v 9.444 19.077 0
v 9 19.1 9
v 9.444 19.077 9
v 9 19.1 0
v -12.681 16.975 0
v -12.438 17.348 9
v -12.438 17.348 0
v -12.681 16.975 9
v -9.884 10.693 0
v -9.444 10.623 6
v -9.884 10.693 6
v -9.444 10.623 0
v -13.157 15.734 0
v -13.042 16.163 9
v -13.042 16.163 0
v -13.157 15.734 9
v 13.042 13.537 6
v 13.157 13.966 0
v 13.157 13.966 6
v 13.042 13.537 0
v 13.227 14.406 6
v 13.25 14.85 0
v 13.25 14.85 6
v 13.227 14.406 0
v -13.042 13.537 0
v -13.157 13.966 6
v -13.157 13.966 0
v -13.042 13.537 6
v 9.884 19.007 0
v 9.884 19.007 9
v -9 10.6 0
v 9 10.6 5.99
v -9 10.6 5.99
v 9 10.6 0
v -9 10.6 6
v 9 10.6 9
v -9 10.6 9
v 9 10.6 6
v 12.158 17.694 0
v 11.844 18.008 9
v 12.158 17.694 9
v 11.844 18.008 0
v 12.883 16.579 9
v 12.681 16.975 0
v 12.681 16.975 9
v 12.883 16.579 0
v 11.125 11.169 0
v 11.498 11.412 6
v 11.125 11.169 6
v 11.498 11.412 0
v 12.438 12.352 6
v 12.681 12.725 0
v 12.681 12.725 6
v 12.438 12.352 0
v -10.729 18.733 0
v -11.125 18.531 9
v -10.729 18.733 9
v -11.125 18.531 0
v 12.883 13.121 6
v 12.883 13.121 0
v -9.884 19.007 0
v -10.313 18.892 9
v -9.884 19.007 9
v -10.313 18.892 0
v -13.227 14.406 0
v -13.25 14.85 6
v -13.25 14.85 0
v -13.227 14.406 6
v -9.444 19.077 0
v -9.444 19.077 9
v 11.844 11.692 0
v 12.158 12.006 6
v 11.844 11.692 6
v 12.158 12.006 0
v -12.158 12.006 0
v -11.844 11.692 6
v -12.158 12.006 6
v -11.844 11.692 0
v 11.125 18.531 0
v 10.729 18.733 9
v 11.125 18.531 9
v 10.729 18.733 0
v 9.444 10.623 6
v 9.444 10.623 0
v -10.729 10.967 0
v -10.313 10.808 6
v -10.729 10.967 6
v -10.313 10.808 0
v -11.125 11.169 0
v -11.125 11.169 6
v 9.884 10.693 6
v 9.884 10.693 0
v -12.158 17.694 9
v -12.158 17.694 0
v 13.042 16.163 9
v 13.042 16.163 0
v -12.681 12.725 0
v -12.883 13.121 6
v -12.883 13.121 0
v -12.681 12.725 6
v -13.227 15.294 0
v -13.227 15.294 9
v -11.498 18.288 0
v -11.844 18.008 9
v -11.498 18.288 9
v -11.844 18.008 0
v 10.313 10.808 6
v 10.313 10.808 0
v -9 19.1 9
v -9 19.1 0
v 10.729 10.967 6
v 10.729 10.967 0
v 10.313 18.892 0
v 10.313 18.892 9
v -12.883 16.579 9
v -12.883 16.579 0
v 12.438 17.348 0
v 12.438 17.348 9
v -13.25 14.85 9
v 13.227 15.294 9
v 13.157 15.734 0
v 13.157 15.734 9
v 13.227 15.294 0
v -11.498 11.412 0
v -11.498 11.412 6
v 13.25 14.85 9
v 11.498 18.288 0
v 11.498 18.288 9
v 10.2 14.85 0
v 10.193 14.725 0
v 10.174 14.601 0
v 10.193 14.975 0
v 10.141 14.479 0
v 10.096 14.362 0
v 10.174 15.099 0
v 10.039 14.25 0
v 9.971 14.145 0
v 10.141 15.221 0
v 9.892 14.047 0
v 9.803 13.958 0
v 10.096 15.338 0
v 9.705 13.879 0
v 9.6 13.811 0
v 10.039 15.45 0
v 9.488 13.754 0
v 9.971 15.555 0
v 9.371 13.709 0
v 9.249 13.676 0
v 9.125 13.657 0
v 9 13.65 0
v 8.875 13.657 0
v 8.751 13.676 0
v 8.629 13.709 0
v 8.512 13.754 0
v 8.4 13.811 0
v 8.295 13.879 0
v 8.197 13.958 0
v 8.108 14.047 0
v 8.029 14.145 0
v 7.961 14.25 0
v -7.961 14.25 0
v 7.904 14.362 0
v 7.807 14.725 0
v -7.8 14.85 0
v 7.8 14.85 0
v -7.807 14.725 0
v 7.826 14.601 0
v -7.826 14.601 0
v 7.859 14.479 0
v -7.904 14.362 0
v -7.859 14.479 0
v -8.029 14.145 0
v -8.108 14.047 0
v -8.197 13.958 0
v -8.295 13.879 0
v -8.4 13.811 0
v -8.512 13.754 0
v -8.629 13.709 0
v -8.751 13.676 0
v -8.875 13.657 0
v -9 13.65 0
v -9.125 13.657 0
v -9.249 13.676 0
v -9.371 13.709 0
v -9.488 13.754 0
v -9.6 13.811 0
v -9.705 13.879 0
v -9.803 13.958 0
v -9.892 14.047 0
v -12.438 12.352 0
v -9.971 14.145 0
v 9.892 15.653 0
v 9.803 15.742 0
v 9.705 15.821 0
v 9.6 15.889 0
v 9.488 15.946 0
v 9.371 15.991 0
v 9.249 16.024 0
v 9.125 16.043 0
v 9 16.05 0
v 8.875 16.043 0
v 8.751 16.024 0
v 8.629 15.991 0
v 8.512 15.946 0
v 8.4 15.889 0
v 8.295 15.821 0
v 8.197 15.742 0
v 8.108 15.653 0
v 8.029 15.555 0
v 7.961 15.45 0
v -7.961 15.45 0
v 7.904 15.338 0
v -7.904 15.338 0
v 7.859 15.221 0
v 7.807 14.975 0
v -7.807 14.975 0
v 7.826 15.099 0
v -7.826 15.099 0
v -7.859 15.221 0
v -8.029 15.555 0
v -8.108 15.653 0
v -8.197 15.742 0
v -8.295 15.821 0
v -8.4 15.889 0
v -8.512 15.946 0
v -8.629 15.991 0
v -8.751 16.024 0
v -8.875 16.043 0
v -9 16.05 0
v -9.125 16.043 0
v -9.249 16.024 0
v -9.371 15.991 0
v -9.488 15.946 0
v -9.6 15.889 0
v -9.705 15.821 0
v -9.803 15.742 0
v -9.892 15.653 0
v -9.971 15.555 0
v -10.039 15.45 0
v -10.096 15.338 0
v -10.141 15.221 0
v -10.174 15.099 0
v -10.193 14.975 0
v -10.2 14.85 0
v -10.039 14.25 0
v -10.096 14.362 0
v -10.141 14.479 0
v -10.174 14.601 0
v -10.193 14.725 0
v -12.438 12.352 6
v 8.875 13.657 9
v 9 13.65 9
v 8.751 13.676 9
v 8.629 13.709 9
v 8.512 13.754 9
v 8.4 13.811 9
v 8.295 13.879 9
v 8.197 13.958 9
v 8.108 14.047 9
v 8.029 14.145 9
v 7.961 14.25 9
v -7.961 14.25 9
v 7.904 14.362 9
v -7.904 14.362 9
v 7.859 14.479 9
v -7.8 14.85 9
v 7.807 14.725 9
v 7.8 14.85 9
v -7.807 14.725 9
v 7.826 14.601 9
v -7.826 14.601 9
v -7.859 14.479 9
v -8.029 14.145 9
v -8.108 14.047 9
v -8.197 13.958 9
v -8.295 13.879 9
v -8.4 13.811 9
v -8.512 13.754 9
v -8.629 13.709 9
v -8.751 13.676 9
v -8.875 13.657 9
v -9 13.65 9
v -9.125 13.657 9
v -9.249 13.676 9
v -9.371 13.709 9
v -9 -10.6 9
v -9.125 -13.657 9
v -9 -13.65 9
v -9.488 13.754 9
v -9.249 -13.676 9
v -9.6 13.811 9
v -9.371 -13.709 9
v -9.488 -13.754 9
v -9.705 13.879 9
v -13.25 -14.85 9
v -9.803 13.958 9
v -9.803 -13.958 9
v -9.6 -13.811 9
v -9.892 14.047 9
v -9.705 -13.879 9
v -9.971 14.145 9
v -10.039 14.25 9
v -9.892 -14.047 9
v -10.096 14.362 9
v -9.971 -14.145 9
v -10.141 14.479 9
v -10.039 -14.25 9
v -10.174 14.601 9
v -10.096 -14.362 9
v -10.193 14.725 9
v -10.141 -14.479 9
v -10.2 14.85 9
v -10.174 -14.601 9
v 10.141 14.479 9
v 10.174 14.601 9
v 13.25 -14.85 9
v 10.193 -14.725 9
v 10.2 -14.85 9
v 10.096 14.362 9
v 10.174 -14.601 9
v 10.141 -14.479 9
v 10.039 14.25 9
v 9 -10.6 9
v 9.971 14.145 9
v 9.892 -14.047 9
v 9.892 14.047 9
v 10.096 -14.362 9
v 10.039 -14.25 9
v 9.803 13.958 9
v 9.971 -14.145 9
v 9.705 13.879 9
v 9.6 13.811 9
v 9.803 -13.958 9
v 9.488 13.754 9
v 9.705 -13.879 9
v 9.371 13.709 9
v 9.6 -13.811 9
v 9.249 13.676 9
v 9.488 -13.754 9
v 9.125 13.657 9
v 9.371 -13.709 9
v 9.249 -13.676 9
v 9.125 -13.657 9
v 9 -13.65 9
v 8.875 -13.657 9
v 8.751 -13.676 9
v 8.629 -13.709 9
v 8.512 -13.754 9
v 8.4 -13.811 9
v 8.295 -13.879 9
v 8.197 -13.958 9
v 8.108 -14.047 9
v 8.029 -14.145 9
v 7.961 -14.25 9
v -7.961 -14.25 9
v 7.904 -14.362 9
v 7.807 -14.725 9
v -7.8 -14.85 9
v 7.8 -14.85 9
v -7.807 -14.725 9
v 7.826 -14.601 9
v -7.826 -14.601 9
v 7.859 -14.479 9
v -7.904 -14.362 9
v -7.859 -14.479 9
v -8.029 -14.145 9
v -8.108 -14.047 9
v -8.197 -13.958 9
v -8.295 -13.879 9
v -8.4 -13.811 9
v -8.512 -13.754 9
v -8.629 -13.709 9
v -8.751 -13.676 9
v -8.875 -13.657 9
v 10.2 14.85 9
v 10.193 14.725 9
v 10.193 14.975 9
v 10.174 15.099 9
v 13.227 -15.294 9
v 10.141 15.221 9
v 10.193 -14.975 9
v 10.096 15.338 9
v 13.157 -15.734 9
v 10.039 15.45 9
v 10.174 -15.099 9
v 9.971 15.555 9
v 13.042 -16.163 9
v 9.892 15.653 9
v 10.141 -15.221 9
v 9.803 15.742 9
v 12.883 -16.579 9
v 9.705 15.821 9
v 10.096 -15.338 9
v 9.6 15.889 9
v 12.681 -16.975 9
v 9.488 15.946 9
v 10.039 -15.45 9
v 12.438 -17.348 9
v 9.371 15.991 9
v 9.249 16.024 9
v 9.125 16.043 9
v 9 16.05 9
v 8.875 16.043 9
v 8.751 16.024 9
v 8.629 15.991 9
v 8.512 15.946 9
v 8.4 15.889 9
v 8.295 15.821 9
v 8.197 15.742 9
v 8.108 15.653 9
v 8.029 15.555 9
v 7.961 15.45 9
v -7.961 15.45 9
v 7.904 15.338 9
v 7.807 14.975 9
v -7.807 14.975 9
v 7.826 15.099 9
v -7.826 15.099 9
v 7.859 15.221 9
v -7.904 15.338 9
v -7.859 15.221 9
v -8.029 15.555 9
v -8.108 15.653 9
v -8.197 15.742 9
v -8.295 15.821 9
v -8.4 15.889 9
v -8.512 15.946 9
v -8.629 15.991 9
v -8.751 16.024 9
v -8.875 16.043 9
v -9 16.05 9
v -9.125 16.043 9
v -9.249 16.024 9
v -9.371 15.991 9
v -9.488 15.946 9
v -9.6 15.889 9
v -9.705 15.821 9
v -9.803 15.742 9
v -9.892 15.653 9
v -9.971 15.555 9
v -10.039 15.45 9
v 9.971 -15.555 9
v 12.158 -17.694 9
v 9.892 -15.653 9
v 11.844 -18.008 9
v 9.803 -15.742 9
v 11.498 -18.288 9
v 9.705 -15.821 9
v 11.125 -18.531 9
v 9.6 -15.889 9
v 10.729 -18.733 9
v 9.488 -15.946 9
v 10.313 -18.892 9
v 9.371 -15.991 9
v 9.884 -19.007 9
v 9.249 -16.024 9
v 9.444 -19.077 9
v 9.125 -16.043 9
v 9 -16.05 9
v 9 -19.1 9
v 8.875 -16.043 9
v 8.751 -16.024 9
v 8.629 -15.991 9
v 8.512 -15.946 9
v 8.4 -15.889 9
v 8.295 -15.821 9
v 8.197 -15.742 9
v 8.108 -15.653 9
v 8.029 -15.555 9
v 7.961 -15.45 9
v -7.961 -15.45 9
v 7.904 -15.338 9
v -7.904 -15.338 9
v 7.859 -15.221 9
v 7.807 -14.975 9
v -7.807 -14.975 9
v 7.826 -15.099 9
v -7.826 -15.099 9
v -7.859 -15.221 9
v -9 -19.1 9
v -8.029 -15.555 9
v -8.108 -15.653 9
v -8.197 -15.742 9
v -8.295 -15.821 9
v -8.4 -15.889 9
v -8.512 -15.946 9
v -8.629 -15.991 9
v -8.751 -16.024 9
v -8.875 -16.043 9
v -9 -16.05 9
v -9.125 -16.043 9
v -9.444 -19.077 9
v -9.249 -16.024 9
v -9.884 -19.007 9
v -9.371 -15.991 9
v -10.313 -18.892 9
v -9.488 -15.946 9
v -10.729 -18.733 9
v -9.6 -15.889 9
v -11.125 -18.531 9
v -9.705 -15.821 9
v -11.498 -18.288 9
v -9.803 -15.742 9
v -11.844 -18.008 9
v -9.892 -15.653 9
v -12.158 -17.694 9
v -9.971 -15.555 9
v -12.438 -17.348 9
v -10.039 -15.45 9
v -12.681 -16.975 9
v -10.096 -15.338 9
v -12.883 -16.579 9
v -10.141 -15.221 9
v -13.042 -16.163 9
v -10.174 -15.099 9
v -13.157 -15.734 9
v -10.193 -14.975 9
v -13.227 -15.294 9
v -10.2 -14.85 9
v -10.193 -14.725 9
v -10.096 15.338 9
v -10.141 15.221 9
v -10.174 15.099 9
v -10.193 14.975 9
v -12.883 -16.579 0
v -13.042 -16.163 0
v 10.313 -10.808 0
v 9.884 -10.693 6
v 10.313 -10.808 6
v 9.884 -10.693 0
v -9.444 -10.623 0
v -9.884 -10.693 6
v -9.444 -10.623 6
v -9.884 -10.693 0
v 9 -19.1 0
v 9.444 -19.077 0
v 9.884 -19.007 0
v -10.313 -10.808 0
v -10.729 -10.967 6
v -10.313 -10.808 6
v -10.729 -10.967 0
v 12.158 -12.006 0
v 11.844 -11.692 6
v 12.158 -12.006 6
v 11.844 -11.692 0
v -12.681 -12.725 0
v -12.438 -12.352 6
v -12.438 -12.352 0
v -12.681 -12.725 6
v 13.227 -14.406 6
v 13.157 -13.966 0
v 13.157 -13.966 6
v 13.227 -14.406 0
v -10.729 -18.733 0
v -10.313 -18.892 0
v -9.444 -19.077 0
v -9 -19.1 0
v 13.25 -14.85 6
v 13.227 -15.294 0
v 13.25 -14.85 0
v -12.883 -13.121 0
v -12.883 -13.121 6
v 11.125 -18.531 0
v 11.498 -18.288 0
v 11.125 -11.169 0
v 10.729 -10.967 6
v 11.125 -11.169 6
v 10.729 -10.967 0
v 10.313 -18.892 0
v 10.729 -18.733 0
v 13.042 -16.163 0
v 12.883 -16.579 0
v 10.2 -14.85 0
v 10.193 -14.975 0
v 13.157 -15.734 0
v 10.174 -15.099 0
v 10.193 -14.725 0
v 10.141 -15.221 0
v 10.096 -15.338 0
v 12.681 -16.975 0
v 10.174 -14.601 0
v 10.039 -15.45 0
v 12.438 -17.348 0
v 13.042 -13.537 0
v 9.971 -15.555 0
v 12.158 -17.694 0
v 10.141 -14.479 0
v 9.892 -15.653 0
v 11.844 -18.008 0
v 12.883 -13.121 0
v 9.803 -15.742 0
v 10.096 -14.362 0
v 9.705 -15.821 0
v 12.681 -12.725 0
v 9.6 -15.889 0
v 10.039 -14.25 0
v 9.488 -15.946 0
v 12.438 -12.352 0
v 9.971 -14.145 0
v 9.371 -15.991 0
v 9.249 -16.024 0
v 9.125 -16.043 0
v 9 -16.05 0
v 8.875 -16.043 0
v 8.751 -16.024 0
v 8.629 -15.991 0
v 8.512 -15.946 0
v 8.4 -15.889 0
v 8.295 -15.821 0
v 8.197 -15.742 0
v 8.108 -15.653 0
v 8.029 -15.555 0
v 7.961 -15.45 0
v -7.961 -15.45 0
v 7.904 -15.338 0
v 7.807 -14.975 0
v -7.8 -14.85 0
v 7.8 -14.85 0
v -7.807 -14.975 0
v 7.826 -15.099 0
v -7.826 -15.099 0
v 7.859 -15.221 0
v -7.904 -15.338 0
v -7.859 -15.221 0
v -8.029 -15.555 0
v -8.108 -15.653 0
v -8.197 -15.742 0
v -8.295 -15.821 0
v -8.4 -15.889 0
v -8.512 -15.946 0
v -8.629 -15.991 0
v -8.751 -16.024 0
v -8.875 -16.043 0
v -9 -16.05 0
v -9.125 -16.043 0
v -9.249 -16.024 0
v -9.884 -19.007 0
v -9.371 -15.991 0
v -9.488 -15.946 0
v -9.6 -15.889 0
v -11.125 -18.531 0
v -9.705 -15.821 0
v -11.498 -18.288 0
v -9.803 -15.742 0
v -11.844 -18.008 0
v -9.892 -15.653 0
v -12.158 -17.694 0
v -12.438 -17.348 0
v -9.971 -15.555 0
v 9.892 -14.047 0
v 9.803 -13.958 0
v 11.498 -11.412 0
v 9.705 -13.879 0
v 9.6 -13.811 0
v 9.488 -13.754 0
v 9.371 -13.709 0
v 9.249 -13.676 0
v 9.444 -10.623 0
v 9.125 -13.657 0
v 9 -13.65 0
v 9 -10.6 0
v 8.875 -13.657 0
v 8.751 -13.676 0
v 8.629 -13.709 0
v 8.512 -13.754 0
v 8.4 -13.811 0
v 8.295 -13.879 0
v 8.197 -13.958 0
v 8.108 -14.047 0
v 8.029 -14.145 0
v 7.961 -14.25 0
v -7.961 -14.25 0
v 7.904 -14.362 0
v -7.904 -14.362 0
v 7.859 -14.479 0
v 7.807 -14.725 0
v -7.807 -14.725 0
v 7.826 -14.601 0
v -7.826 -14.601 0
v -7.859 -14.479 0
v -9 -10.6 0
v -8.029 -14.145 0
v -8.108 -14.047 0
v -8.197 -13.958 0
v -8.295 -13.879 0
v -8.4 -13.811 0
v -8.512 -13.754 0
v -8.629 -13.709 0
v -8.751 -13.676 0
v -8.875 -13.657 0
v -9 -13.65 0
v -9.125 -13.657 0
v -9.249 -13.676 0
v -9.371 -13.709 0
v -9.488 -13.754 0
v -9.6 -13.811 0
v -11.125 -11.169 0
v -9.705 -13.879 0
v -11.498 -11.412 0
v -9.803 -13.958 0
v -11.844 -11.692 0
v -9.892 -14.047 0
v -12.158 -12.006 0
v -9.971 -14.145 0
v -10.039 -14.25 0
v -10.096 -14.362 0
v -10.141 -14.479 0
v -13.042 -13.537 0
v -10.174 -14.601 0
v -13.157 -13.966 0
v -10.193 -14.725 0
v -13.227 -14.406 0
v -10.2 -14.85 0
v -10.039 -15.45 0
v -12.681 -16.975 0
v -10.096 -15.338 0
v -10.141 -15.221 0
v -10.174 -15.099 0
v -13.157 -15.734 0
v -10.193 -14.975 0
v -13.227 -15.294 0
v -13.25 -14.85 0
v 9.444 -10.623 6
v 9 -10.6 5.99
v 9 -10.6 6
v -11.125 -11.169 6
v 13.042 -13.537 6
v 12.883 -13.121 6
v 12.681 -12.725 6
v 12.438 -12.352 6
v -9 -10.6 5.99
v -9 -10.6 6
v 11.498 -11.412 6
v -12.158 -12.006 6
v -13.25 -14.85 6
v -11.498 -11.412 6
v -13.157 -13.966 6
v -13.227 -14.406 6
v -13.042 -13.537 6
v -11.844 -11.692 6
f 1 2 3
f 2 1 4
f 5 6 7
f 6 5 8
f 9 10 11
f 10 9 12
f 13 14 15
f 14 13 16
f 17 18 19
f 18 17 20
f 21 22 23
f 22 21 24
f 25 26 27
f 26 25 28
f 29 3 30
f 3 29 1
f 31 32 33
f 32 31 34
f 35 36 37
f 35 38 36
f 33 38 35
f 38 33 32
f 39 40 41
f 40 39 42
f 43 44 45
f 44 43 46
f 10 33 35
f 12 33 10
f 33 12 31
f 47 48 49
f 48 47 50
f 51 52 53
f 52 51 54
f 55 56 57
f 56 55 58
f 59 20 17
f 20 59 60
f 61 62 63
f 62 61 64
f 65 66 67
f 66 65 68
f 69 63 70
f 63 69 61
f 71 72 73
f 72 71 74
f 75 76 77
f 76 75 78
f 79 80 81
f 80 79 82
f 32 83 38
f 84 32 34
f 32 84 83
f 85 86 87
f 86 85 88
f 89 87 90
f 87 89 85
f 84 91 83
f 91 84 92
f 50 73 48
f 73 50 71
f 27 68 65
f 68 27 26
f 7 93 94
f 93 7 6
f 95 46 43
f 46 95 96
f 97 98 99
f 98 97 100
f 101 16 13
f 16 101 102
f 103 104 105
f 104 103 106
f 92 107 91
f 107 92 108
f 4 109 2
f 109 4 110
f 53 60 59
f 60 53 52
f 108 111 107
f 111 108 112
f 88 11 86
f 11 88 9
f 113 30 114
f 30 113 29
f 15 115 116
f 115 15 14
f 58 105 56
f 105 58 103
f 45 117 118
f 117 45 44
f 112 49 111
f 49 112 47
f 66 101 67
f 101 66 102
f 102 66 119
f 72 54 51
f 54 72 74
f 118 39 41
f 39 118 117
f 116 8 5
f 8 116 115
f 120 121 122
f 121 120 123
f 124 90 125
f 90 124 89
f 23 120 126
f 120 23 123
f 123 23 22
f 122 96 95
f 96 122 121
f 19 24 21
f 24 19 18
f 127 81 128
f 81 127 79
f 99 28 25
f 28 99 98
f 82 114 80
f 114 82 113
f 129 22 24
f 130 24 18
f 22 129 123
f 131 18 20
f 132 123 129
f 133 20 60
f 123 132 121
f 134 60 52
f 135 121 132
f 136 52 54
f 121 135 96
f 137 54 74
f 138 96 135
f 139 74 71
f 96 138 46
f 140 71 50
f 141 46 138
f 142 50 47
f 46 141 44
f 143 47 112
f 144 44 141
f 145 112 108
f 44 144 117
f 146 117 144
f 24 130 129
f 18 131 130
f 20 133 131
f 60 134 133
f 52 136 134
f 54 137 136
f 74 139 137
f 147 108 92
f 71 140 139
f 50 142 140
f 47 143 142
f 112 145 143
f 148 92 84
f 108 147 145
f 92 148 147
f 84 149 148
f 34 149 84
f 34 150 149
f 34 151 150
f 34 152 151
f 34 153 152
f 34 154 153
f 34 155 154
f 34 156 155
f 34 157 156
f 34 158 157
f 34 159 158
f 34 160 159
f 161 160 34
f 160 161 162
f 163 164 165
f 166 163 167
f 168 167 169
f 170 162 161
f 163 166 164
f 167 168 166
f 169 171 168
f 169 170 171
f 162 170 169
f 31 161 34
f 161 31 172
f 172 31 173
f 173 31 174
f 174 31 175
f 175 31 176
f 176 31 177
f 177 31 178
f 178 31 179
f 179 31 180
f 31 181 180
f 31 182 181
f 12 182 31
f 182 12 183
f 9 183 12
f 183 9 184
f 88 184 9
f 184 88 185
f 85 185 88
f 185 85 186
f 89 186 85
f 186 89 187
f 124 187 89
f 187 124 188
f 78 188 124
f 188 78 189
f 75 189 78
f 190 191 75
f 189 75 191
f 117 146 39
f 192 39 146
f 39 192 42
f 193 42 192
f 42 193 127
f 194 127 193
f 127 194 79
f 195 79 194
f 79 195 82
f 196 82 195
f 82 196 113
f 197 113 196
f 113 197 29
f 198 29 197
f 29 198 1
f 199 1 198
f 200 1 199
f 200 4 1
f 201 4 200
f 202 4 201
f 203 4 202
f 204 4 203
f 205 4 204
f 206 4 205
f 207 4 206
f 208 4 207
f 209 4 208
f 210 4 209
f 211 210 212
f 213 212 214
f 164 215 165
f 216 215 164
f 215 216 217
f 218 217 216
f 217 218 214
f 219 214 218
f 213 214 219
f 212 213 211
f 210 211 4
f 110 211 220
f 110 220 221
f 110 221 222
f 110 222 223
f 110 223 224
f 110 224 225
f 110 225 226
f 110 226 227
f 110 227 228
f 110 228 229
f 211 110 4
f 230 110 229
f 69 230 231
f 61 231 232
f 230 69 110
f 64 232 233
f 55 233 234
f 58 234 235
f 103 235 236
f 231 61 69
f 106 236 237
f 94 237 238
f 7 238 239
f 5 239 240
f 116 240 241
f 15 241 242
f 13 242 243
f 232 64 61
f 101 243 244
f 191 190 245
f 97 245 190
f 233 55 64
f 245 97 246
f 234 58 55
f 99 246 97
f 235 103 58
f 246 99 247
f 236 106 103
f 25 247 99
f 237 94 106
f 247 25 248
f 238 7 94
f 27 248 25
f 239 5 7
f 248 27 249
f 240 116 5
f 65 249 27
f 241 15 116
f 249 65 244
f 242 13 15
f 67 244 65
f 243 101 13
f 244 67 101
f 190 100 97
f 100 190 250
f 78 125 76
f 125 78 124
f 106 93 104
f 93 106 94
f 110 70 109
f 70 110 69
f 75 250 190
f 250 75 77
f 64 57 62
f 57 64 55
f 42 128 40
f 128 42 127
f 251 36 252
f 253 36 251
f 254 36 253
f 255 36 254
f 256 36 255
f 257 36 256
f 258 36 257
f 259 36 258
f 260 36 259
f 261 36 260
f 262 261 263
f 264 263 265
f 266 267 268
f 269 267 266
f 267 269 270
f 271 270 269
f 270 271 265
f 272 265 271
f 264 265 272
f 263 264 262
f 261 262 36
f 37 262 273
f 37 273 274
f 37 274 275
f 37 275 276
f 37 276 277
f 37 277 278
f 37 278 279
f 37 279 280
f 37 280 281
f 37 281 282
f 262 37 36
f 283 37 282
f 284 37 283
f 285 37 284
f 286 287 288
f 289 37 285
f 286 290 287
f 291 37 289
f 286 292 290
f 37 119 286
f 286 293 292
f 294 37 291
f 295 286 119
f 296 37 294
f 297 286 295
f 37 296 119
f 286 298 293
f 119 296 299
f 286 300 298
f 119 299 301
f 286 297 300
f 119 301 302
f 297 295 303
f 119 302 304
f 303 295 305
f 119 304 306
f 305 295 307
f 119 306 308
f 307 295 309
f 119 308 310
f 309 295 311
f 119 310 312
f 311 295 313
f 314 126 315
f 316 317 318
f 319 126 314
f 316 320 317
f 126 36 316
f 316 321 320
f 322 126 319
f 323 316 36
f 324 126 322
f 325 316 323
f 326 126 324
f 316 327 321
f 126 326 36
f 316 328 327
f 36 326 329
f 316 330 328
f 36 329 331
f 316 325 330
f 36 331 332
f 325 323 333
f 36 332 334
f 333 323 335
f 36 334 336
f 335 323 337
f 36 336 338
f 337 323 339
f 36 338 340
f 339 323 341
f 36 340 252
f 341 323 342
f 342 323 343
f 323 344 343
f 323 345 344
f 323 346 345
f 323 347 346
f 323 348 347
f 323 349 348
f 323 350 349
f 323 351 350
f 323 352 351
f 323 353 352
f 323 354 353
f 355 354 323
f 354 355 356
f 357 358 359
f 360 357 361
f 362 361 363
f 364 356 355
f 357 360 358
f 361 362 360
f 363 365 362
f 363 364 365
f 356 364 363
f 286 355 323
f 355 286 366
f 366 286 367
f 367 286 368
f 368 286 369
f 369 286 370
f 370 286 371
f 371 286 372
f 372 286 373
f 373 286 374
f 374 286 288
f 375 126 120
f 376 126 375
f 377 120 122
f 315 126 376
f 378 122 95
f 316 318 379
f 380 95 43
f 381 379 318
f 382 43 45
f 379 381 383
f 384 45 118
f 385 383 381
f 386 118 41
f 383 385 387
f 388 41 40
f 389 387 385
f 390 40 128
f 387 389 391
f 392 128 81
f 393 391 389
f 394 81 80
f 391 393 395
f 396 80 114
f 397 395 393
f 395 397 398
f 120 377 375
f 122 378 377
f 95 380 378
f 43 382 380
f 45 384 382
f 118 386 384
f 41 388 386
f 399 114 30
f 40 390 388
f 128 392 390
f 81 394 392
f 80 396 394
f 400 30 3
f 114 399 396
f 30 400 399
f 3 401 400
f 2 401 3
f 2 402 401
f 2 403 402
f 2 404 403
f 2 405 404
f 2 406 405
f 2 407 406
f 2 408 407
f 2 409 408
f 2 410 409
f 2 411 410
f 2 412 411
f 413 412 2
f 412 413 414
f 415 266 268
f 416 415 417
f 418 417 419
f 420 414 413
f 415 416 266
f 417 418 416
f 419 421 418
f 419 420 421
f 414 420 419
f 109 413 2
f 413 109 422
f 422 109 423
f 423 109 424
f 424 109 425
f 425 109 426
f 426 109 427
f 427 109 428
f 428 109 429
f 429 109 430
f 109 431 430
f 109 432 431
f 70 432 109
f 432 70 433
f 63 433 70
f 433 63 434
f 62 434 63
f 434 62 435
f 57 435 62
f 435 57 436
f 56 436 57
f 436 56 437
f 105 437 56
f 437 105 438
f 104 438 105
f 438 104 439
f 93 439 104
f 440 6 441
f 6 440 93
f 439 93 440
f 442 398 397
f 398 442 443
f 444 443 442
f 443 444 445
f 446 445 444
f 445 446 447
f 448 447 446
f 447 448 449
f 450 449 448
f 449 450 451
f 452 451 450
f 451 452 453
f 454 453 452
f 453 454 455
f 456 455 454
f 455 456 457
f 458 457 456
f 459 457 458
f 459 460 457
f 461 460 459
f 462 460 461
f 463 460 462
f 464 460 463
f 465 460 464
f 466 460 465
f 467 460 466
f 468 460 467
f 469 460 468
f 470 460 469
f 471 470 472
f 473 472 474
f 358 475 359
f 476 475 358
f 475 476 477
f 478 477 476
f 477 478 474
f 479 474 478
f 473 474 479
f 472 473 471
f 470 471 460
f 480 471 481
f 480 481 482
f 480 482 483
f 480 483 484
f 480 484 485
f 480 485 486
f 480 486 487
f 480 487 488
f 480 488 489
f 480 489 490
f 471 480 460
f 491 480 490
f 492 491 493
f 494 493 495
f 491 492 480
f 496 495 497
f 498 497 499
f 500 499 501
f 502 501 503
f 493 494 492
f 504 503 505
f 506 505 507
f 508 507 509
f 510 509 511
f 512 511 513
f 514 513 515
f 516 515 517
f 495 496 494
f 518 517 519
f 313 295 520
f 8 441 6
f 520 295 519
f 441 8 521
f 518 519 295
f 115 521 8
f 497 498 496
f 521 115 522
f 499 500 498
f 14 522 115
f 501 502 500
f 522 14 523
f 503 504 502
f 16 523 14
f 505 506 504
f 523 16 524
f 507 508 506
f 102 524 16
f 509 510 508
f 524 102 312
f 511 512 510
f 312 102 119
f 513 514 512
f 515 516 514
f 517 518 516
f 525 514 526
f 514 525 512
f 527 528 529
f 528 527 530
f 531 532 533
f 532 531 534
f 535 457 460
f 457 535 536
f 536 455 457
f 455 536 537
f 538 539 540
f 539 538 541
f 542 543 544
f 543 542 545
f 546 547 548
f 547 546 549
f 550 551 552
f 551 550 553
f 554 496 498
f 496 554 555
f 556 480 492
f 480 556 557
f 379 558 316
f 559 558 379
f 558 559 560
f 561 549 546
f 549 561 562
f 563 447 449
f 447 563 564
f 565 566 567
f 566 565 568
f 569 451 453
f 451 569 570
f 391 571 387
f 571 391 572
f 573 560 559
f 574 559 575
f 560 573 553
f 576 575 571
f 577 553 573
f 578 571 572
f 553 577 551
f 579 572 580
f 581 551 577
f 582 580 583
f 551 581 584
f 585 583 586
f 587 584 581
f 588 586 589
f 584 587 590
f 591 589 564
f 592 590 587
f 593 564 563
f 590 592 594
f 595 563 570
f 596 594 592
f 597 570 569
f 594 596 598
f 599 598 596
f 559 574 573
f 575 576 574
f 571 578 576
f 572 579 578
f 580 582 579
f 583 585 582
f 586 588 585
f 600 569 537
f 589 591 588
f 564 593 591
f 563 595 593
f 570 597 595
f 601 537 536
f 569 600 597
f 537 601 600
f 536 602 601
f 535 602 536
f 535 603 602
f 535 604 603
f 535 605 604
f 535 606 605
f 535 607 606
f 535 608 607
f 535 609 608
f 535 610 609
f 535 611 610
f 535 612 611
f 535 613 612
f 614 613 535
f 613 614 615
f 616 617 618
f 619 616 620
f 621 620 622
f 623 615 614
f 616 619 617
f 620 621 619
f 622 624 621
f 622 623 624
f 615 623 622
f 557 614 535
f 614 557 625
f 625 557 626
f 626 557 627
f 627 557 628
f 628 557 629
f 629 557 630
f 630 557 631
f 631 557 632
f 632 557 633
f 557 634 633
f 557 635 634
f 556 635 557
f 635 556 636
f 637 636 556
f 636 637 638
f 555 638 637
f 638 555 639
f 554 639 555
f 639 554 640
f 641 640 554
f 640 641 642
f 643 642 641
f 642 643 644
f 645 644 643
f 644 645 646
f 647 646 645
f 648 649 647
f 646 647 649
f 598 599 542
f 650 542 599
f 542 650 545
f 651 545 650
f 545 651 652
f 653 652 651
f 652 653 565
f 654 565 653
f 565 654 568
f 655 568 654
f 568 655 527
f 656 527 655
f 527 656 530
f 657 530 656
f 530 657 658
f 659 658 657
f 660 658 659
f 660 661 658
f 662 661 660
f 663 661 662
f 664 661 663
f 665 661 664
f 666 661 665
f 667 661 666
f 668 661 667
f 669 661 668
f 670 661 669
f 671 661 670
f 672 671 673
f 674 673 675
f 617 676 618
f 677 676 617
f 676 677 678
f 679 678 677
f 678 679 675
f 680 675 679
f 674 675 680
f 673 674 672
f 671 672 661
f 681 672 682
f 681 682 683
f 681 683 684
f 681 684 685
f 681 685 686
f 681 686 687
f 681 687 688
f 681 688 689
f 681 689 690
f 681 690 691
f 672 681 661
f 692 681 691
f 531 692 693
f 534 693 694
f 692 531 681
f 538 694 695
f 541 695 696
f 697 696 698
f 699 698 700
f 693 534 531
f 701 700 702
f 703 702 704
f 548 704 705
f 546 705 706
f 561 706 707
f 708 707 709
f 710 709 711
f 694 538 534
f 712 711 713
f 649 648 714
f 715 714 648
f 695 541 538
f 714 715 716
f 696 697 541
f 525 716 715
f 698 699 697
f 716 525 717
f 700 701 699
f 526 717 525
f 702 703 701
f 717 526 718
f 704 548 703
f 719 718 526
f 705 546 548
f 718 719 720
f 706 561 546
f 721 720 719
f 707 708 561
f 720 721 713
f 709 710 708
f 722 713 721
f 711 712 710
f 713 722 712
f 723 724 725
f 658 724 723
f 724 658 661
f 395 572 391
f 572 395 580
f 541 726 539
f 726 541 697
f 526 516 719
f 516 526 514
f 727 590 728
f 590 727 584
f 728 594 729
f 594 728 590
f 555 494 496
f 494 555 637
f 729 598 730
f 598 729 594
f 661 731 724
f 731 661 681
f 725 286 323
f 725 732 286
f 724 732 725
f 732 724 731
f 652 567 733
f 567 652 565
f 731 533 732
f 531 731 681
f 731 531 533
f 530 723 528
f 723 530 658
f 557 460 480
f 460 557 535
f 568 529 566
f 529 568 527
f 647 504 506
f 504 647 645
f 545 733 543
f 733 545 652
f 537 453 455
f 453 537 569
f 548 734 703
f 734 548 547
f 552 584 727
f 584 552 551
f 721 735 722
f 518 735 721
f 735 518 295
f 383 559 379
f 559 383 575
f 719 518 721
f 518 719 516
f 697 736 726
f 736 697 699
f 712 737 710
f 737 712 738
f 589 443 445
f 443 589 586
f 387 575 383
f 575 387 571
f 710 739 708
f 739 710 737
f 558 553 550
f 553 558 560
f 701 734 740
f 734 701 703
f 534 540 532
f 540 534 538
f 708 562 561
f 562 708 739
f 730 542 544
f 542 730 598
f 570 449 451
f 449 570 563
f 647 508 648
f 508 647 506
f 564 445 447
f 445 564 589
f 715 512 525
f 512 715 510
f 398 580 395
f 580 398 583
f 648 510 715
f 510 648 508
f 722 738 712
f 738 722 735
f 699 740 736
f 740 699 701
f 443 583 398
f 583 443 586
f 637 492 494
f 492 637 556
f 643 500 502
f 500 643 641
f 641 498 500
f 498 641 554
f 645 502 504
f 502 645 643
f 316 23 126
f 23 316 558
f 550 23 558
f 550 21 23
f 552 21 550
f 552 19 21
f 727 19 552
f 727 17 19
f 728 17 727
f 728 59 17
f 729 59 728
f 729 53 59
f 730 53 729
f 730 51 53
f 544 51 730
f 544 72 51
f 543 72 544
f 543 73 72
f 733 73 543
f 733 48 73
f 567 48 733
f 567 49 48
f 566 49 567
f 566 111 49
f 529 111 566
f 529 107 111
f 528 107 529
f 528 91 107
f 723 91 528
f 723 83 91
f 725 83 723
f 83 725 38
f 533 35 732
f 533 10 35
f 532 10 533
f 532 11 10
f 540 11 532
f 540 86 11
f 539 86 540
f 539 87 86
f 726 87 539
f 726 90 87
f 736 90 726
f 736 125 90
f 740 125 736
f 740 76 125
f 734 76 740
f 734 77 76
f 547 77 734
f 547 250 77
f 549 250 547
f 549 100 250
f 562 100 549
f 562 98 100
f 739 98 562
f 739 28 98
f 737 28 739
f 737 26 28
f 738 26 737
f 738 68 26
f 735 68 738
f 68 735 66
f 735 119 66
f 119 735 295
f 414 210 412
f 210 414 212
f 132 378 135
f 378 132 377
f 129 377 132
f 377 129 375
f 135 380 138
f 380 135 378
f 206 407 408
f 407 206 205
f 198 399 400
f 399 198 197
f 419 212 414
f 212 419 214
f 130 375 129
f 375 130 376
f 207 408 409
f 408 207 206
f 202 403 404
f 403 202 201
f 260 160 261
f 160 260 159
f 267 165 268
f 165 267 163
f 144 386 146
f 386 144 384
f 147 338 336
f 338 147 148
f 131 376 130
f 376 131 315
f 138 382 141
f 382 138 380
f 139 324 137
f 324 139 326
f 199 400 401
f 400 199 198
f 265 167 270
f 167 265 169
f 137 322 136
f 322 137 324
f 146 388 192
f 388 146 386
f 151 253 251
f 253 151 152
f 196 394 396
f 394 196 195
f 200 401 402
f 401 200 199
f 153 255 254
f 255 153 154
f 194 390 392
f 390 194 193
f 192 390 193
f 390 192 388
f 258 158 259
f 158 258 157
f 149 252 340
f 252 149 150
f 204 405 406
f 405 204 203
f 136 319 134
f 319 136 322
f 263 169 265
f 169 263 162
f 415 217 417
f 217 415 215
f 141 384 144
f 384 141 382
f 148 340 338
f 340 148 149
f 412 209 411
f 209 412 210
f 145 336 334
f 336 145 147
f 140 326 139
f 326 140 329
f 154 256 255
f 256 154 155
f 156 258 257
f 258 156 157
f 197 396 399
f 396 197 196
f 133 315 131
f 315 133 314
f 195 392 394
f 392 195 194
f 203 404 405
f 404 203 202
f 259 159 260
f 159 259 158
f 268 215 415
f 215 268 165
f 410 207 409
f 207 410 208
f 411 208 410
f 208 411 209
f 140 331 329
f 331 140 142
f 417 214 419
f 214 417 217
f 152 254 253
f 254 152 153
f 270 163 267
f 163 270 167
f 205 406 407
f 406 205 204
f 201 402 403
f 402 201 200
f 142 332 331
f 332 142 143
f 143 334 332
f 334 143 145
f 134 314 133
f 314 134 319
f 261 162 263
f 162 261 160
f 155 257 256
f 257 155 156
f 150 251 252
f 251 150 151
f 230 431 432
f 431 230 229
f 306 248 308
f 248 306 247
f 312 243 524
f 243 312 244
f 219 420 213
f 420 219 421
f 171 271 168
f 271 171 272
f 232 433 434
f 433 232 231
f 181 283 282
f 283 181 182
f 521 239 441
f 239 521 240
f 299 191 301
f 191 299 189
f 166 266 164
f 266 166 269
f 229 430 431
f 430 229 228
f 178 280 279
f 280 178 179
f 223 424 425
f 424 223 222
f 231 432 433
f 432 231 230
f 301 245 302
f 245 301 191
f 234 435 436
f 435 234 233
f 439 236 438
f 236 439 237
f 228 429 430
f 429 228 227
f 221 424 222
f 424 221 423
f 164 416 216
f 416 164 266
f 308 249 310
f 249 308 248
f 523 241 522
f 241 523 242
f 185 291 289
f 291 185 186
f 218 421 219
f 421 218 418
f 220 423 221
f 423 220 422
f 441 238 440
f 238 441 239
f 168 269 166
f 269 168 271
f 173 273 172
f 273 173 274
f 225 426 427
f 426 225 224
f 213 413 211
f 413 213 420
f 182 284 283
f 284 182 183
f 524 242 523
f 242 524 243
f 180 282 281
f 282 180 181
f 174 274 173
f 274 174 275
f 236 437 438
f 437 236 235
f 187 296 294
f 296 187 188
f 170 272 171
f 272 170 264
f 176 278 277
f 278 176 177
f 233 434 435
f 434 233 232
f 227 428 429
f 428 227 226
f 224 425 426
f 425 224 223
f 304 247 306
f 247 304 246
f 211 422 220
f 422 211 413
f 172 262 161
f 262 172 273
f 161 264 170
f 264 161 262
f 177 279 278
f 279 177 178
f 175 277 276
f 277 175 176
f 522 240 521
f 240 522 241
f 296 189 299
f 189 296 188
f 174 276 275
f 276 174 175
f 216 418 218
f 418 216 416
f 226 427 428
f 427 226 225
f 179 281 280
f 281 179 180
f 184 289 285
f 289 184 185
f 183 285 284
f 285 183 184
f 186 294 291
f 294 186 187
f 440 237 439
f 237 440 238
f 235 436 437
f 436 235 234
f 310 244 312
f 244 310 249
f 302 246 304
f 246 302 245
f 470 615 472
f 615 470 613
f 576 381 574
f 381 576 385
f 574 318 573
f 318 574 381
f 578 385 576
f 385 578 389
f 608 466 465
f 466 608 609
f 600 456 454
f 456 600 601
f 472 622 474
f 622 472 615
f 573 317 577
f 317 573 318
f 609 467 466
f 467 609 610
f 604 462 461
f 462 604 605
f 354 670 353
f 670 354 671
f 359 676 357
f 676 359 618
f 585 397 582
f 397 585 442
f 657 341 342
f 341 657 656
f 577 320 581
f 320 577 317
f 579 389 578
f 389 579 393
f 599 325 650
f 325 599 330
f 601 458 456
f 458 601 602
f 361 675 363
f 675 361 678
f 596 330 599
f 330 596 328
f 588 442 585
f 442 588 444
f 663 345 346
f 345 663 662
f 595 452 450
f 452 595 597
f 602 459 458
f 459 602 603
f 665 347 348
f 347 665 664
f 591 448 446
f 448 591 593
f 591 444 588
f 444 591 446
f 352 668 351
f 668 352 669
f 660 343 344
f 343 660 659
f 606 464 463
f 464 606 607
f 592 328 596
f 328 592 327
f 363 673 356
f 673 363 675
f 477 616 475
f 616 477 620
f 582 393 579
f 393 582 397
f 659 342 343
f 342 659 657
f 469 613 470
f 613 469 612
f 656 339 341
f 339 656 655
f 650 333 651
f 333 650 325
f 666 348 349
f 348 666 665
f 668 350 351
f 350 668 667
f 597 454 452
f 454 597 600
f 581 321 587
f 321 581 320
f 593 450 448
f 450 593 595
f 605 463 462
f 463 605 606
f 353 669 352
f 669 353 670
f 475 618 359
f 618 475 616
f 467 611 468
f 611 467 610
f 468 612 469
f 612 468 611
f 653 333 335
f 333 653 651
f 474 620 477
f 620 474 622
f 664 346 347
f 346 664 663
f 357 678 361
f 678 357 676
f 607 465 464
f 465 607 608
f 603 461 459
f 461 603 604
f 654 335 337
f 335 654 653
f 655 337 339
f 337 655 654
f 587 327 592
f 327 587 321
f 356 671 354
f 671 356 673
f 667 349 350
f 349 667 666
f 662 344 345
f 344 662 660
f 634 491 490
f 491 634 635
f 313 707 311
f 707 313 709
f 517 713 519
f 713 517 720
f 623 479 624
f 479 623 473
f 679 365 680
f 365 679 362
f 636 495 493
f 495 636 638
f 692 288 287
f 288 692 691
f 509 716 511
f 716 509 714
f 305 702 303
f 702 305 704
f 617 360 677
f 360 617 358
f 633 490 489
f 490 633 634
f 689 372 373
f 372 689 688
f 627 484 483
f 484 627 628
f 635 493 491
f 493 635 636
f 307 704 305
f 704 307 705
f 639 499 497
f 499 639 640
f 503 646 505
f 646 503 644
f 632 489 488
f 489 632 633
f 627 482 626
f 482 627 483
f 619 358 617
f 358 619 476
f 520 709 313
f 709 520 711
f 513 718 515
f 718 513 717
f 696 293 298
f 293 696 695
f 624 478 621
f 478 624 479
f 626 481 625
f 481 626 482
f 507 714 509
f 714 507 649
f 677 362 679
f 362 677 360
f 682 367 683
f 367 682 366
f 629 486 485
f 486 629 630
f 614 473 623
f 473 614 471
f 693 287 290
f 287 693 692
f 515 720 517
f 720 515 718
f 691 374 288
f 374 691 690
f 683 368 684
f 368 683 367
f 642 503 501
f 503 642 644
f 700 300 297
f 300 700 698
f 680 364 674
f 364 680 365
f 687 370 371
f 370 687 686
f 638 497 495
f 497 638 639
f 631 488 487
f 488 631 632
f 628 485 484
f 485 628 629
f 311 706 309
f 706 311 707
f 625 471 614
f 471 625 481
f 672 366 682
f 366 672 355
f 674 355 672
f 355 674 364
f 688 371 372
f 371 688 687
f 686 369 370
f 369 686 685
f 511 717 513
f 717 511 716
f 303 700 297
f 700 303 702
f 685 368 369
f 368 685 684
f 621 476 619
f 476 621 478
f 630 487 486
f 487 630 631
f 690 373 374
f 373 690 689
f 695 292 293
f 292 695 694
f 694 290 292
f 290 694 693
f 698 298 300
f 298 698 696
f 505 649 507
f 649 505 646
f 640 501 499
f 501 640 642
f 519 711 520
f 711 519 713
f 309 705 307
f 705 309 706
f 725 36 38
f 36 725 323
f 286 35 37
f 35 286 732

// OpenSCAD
fudge = 0.01;

spacer_height = 9.0;
spacer_width = 8.5;
spacer_length = 26.5;

hole_diameter = 2.4;
hole_x_spacing = spacer_length-spacer_width;
hole_y_spacing = 38.2-spacer_width;

connection_height = 3.0;
connection_width = (spacer_length-18.0)/2;

module spacer()
{
    difference()
    {
        union()
        {
            for (my = [0,1]) mirror([0,my,0])
            {
                hull() for (mx = [0,1]) mirror([mx,0,0])
                    translate([hole_x_spacing/2,hole_y_spacing/2,0])
                        cylinder(d=spacer_width,h=spacer_height,$fn=60);
            }
            translate([-spacer_length/2,-hole_y_spacing/2,spacer_height-connection_height])
                cube([spacer_length,hole_y_spacing,connection_height]);
        }
        for (my = [0,1]) mirror([0,my,0])
        {
            for (mx = [0,1]) mirror([mx,0,0])
                translate([hole_x_spacing/2,hole_y_spacing/2,-fudge])
                    cylinder(d=hole_diameter,h=spacer_height+2*fudge,$fn=60);
        }
        translate([-spacer_length/2+connection_width,-hole_y_spacing/2+spacer_width/2,spacer_height-connection_height-fudge])
            cube([spacer_length-2*connection_width,hole_y_spacing-spacer_width,connection_height+2*fudge]);
    }
}

spacer();
